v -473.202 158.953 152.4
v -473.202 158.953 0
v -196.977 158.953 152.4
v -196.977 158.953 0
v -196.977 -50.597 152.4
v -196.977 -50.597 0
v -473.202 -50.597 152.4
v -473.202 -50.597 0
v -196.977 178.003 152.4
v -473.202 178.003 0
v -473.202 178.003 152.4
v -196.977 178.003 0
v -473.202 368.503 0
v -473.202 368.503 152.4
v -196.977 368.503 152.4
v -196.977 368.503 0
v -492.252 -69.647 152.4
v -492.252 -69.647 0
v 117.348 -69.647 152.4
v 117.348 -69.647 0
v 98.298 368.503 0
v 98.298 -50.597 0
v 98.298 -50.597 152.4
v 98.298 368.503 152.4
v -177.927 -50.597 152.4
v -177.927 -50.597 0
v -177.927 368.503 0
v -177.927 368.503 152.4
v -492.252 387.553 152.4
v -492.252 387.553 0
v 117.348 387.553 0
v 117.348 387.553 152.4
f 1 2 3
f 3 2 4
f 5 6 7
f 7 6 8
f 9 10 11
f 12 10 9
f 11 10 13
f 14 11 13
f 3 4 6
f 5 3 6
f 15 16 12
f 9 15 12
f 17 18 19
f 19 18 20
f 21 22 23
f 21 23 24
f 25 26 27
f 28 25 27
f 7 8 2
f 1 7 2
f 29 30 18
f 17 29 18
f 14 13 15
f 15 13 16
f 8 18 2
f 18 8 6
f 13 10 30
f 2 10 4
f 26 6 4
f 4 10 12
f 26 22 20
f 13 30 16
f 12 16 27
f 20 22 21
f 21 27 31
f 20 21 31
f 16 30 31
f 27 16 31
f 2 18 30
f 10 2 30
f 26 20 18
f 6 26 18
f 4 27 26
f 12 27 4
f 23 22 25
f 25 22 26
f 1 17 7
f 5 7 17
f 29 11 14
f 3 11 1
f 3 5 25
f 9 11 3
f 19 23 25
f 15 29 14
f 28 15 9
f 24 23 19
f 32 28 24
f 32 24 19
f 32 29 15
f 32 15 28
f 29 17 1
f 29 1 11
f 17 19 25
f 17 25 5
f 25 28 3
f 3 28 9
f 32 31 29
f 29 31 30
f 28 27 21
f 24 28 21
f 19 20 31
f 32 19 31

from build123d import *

# Parameters (mm, degrees)
F0_W     = 276.225
F0_H     = 19.05
F0_W_2   = 19.05
F0_H_2   = 419.1
F1_DEPTH = 152.4


with BuildPart() as f1:
    # F0 (on Top) → F1 (new body)
    with BuildSketch(Plane.XY):
        Polygon((-473.202007, 368.503202), (-492.252007, 368.503202), (-492.252007, -50.596798), (-473.202007, -50.596798), (-473.202007, 158.953202), (-473.202007, 178.003202), align=None)
        with Locations((-335.089507, 168.478202)):
            Rectangle(F0_W, F0_H)
        Polygon((117.347993, 387.553202), (-492.252007, 387.553202), (-492.252007, 368.503202), (-473.202007, 368.503202), (-196.977007, 368.503202), (-177.927007, 368.503202), (98.297993, 368.503202), (117.347993, 368.503202), align=None)
        Polygon((-177.927007, 368.503202), (-196.977007, 368.503202), (-196.977007, 178.003202), (-196.977007, 158.953202), (-196.977007, -50.596798), (-177.927007, -50.596798), align=None)
        with Locations((107.822993, 158.953202)):
            Rectangle(F0_W_2, F0_H_2)
        Polygon((-473.202007, -50.596798), (-492.252007, -50.596798), (-492.252007, -69.646798), (117.347993, -69.646798), (117.347993, -50.596798), (98.297993, -50.596798), (-177.927007, -50.596798), (-196.977007, -50.596798), align=None)
    extrude(amount=F1_DEPTH)


solid = f1.part
